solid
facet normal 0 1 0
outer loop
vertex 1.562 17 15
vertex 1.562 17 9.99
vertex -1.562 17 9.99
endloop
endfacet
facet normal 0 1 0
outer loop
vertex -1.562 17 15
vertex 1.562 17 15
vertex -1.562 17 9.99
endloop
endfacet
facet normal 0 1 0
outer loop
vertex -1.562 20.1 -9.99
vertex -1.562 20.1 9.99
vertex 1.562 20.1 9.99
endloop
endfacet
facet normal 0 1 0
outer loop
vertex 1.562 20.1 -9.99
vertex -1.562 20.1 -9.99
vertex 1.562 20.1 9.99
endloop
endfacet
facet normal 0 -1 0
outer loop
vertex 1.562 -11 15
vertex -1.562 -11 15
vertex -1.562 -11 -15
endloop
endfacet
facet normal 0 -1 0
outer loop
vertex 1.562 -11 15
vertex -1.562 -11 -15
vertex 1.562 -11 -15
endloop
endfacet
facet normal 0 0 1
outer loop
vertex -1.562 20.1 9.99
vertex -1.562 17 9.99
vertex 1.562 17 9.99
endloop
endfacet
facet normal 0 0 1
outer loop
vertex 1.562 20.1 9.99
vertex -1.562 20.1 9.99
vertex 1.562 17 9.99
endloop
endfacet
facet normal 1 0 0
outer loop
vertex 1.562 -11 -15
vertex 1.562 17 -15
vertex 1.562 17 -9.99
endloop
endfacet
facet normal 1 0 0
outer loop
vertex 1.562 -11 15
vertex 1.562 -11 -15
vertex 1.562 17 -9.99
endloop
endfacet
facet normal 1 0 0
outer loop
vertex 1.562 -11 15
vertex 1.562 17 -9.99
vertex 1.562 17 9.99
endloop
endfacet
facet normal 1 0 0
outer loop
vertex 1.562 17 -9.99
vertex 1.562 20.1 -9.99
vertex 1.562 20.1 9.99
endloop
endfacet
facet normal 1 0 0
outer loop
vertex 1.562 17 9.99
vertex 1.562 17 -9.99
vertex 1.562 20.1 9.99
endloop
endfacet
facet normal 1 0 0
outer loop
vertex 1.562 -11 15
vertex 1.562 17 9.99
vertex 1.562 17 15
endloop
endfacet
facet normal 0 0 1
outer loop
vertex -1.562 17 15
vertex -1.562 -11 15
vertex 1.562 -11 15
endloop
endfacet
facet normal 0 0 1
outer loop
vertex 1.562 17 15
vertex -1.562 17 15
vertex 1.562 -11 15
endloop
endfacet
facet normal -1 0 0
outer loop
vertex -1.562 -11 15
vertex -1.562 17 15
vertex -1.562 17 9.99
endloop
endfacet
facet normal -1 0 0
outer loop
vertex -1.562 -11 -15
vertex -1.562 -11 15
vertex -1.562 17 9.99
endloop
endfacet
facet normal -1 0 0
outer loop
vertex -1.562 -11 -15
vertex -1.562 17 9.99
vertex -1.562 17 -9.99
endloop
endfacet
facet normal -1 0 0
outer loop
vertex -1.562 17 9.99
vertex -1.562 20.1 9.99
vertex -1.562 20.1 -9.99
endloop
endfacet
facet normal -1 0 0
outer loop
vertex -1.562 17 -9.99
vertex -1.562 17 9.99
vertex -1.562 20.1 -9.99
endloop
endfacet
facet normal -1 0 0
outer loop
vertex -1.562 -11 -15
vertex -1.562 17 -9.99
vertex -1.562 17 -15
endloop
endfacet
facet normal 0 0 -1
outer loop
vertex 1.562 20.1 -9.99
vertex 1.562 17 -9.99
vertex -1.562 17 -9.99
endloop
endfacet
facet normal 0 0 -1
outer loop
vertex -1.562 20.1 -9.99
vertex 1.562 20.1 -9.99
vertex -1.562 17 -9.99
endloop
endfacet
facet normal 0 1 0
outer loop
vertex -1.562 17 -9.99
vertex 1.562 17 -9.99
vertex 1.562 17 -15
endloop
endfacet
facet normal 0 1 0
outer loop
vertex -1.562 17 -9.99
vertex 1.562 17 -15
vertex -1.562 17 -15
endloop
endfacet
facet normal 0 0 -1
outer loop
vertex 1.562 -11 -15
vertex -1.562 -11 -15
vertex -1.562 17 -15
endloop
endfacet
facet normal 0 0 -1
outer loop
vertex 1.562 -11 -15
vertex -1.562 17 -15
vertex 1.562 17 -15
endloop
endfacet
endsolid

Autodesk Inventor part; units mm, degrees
ref_plane "YZ Plane" through (0, 0, 0) normal (1, 0, 0) x (0, 1, 0)
ref_plane "XZ Plane" through (0, 0, 0) normal (0, 1, 0) x (-1, 0, 0)
ref_plane "XY Plane" through (0, 0, 0) normal (0, 0, 1) x (1, 0, 0)
sketch "Sketch1" plane through (0, 0, 0) normal (0, 1, 0) x (-1, 0, 0)
  line L0 (1.5625, 15) -> (-1.5625, 15)
  line L1 (-1.5625, 15) -> (-1.5625, -15)
  line L2 (-1.5625, -15) -> (1.5625, -15)
  line L3 (1.5625, -15) -> (1.5625, 15)
  line L4 (1.5625, 15) -> (-1.5625, -15) construction
  line L5 (-1.5625, 15) -> (1.5625, -15) construction
  point P0 (0, 0)
  dimension "d0" = 3.125
  dimension "d1" = 30
extrude "Extrusion1" add sketch "Sketch1" along normal blind 17
sketch "Sketch3" plane through (0, 17, 0) normal (0, 1, 0) x (1, 0, 0)
  line L0 (-1.5625, -9.99) -> (1.5625, -9.99)
  line L1 (1.5625, -9.99) -> (1.5625, 9.99)
  line L2 (1.5625, 9.99) -> (-1.5625, 9.99)
  line L3 (-1.5625, 9.99) -> (-1.5625, -9.99)
  line L4 (-1.5625, -9.99) -> (1.5625, 9.99) construction
  line L5 (1.5625, -9.99) -> (-1.5625, 9.99) construction
  point P0 (0, 0)
  dimension "d4" = 3.125
  dimension "d5" = 19.98
extrude "Extrusion2" add sketch "Sketch3" along normal blind 3.1
sketch "Sketch4" plane through (0, 0, 0) normal (0, -1, 0) x (1, 0, 0)
  line L0 (-1.5625, 15) -> (1.5625, 15) projected
  line L1 (-1.5625, -15) -> (-1.5625, -9.99) projected
  line L2 (1.5625, 15) -> (-1.5625, 15)
  line L3 (-1.5625, 15) -> (-1.5625, -15)
  line L4 (-1.5625, -15) -> (1.5625, -15)
  line L5 (1.5625, -15) -> (1.5625, 15)
  point P0 (0, 0)
extrude "Extrusion3" add sketch "Sketch4" along normal blind 11
properties part number "bate2_3DPrint"
